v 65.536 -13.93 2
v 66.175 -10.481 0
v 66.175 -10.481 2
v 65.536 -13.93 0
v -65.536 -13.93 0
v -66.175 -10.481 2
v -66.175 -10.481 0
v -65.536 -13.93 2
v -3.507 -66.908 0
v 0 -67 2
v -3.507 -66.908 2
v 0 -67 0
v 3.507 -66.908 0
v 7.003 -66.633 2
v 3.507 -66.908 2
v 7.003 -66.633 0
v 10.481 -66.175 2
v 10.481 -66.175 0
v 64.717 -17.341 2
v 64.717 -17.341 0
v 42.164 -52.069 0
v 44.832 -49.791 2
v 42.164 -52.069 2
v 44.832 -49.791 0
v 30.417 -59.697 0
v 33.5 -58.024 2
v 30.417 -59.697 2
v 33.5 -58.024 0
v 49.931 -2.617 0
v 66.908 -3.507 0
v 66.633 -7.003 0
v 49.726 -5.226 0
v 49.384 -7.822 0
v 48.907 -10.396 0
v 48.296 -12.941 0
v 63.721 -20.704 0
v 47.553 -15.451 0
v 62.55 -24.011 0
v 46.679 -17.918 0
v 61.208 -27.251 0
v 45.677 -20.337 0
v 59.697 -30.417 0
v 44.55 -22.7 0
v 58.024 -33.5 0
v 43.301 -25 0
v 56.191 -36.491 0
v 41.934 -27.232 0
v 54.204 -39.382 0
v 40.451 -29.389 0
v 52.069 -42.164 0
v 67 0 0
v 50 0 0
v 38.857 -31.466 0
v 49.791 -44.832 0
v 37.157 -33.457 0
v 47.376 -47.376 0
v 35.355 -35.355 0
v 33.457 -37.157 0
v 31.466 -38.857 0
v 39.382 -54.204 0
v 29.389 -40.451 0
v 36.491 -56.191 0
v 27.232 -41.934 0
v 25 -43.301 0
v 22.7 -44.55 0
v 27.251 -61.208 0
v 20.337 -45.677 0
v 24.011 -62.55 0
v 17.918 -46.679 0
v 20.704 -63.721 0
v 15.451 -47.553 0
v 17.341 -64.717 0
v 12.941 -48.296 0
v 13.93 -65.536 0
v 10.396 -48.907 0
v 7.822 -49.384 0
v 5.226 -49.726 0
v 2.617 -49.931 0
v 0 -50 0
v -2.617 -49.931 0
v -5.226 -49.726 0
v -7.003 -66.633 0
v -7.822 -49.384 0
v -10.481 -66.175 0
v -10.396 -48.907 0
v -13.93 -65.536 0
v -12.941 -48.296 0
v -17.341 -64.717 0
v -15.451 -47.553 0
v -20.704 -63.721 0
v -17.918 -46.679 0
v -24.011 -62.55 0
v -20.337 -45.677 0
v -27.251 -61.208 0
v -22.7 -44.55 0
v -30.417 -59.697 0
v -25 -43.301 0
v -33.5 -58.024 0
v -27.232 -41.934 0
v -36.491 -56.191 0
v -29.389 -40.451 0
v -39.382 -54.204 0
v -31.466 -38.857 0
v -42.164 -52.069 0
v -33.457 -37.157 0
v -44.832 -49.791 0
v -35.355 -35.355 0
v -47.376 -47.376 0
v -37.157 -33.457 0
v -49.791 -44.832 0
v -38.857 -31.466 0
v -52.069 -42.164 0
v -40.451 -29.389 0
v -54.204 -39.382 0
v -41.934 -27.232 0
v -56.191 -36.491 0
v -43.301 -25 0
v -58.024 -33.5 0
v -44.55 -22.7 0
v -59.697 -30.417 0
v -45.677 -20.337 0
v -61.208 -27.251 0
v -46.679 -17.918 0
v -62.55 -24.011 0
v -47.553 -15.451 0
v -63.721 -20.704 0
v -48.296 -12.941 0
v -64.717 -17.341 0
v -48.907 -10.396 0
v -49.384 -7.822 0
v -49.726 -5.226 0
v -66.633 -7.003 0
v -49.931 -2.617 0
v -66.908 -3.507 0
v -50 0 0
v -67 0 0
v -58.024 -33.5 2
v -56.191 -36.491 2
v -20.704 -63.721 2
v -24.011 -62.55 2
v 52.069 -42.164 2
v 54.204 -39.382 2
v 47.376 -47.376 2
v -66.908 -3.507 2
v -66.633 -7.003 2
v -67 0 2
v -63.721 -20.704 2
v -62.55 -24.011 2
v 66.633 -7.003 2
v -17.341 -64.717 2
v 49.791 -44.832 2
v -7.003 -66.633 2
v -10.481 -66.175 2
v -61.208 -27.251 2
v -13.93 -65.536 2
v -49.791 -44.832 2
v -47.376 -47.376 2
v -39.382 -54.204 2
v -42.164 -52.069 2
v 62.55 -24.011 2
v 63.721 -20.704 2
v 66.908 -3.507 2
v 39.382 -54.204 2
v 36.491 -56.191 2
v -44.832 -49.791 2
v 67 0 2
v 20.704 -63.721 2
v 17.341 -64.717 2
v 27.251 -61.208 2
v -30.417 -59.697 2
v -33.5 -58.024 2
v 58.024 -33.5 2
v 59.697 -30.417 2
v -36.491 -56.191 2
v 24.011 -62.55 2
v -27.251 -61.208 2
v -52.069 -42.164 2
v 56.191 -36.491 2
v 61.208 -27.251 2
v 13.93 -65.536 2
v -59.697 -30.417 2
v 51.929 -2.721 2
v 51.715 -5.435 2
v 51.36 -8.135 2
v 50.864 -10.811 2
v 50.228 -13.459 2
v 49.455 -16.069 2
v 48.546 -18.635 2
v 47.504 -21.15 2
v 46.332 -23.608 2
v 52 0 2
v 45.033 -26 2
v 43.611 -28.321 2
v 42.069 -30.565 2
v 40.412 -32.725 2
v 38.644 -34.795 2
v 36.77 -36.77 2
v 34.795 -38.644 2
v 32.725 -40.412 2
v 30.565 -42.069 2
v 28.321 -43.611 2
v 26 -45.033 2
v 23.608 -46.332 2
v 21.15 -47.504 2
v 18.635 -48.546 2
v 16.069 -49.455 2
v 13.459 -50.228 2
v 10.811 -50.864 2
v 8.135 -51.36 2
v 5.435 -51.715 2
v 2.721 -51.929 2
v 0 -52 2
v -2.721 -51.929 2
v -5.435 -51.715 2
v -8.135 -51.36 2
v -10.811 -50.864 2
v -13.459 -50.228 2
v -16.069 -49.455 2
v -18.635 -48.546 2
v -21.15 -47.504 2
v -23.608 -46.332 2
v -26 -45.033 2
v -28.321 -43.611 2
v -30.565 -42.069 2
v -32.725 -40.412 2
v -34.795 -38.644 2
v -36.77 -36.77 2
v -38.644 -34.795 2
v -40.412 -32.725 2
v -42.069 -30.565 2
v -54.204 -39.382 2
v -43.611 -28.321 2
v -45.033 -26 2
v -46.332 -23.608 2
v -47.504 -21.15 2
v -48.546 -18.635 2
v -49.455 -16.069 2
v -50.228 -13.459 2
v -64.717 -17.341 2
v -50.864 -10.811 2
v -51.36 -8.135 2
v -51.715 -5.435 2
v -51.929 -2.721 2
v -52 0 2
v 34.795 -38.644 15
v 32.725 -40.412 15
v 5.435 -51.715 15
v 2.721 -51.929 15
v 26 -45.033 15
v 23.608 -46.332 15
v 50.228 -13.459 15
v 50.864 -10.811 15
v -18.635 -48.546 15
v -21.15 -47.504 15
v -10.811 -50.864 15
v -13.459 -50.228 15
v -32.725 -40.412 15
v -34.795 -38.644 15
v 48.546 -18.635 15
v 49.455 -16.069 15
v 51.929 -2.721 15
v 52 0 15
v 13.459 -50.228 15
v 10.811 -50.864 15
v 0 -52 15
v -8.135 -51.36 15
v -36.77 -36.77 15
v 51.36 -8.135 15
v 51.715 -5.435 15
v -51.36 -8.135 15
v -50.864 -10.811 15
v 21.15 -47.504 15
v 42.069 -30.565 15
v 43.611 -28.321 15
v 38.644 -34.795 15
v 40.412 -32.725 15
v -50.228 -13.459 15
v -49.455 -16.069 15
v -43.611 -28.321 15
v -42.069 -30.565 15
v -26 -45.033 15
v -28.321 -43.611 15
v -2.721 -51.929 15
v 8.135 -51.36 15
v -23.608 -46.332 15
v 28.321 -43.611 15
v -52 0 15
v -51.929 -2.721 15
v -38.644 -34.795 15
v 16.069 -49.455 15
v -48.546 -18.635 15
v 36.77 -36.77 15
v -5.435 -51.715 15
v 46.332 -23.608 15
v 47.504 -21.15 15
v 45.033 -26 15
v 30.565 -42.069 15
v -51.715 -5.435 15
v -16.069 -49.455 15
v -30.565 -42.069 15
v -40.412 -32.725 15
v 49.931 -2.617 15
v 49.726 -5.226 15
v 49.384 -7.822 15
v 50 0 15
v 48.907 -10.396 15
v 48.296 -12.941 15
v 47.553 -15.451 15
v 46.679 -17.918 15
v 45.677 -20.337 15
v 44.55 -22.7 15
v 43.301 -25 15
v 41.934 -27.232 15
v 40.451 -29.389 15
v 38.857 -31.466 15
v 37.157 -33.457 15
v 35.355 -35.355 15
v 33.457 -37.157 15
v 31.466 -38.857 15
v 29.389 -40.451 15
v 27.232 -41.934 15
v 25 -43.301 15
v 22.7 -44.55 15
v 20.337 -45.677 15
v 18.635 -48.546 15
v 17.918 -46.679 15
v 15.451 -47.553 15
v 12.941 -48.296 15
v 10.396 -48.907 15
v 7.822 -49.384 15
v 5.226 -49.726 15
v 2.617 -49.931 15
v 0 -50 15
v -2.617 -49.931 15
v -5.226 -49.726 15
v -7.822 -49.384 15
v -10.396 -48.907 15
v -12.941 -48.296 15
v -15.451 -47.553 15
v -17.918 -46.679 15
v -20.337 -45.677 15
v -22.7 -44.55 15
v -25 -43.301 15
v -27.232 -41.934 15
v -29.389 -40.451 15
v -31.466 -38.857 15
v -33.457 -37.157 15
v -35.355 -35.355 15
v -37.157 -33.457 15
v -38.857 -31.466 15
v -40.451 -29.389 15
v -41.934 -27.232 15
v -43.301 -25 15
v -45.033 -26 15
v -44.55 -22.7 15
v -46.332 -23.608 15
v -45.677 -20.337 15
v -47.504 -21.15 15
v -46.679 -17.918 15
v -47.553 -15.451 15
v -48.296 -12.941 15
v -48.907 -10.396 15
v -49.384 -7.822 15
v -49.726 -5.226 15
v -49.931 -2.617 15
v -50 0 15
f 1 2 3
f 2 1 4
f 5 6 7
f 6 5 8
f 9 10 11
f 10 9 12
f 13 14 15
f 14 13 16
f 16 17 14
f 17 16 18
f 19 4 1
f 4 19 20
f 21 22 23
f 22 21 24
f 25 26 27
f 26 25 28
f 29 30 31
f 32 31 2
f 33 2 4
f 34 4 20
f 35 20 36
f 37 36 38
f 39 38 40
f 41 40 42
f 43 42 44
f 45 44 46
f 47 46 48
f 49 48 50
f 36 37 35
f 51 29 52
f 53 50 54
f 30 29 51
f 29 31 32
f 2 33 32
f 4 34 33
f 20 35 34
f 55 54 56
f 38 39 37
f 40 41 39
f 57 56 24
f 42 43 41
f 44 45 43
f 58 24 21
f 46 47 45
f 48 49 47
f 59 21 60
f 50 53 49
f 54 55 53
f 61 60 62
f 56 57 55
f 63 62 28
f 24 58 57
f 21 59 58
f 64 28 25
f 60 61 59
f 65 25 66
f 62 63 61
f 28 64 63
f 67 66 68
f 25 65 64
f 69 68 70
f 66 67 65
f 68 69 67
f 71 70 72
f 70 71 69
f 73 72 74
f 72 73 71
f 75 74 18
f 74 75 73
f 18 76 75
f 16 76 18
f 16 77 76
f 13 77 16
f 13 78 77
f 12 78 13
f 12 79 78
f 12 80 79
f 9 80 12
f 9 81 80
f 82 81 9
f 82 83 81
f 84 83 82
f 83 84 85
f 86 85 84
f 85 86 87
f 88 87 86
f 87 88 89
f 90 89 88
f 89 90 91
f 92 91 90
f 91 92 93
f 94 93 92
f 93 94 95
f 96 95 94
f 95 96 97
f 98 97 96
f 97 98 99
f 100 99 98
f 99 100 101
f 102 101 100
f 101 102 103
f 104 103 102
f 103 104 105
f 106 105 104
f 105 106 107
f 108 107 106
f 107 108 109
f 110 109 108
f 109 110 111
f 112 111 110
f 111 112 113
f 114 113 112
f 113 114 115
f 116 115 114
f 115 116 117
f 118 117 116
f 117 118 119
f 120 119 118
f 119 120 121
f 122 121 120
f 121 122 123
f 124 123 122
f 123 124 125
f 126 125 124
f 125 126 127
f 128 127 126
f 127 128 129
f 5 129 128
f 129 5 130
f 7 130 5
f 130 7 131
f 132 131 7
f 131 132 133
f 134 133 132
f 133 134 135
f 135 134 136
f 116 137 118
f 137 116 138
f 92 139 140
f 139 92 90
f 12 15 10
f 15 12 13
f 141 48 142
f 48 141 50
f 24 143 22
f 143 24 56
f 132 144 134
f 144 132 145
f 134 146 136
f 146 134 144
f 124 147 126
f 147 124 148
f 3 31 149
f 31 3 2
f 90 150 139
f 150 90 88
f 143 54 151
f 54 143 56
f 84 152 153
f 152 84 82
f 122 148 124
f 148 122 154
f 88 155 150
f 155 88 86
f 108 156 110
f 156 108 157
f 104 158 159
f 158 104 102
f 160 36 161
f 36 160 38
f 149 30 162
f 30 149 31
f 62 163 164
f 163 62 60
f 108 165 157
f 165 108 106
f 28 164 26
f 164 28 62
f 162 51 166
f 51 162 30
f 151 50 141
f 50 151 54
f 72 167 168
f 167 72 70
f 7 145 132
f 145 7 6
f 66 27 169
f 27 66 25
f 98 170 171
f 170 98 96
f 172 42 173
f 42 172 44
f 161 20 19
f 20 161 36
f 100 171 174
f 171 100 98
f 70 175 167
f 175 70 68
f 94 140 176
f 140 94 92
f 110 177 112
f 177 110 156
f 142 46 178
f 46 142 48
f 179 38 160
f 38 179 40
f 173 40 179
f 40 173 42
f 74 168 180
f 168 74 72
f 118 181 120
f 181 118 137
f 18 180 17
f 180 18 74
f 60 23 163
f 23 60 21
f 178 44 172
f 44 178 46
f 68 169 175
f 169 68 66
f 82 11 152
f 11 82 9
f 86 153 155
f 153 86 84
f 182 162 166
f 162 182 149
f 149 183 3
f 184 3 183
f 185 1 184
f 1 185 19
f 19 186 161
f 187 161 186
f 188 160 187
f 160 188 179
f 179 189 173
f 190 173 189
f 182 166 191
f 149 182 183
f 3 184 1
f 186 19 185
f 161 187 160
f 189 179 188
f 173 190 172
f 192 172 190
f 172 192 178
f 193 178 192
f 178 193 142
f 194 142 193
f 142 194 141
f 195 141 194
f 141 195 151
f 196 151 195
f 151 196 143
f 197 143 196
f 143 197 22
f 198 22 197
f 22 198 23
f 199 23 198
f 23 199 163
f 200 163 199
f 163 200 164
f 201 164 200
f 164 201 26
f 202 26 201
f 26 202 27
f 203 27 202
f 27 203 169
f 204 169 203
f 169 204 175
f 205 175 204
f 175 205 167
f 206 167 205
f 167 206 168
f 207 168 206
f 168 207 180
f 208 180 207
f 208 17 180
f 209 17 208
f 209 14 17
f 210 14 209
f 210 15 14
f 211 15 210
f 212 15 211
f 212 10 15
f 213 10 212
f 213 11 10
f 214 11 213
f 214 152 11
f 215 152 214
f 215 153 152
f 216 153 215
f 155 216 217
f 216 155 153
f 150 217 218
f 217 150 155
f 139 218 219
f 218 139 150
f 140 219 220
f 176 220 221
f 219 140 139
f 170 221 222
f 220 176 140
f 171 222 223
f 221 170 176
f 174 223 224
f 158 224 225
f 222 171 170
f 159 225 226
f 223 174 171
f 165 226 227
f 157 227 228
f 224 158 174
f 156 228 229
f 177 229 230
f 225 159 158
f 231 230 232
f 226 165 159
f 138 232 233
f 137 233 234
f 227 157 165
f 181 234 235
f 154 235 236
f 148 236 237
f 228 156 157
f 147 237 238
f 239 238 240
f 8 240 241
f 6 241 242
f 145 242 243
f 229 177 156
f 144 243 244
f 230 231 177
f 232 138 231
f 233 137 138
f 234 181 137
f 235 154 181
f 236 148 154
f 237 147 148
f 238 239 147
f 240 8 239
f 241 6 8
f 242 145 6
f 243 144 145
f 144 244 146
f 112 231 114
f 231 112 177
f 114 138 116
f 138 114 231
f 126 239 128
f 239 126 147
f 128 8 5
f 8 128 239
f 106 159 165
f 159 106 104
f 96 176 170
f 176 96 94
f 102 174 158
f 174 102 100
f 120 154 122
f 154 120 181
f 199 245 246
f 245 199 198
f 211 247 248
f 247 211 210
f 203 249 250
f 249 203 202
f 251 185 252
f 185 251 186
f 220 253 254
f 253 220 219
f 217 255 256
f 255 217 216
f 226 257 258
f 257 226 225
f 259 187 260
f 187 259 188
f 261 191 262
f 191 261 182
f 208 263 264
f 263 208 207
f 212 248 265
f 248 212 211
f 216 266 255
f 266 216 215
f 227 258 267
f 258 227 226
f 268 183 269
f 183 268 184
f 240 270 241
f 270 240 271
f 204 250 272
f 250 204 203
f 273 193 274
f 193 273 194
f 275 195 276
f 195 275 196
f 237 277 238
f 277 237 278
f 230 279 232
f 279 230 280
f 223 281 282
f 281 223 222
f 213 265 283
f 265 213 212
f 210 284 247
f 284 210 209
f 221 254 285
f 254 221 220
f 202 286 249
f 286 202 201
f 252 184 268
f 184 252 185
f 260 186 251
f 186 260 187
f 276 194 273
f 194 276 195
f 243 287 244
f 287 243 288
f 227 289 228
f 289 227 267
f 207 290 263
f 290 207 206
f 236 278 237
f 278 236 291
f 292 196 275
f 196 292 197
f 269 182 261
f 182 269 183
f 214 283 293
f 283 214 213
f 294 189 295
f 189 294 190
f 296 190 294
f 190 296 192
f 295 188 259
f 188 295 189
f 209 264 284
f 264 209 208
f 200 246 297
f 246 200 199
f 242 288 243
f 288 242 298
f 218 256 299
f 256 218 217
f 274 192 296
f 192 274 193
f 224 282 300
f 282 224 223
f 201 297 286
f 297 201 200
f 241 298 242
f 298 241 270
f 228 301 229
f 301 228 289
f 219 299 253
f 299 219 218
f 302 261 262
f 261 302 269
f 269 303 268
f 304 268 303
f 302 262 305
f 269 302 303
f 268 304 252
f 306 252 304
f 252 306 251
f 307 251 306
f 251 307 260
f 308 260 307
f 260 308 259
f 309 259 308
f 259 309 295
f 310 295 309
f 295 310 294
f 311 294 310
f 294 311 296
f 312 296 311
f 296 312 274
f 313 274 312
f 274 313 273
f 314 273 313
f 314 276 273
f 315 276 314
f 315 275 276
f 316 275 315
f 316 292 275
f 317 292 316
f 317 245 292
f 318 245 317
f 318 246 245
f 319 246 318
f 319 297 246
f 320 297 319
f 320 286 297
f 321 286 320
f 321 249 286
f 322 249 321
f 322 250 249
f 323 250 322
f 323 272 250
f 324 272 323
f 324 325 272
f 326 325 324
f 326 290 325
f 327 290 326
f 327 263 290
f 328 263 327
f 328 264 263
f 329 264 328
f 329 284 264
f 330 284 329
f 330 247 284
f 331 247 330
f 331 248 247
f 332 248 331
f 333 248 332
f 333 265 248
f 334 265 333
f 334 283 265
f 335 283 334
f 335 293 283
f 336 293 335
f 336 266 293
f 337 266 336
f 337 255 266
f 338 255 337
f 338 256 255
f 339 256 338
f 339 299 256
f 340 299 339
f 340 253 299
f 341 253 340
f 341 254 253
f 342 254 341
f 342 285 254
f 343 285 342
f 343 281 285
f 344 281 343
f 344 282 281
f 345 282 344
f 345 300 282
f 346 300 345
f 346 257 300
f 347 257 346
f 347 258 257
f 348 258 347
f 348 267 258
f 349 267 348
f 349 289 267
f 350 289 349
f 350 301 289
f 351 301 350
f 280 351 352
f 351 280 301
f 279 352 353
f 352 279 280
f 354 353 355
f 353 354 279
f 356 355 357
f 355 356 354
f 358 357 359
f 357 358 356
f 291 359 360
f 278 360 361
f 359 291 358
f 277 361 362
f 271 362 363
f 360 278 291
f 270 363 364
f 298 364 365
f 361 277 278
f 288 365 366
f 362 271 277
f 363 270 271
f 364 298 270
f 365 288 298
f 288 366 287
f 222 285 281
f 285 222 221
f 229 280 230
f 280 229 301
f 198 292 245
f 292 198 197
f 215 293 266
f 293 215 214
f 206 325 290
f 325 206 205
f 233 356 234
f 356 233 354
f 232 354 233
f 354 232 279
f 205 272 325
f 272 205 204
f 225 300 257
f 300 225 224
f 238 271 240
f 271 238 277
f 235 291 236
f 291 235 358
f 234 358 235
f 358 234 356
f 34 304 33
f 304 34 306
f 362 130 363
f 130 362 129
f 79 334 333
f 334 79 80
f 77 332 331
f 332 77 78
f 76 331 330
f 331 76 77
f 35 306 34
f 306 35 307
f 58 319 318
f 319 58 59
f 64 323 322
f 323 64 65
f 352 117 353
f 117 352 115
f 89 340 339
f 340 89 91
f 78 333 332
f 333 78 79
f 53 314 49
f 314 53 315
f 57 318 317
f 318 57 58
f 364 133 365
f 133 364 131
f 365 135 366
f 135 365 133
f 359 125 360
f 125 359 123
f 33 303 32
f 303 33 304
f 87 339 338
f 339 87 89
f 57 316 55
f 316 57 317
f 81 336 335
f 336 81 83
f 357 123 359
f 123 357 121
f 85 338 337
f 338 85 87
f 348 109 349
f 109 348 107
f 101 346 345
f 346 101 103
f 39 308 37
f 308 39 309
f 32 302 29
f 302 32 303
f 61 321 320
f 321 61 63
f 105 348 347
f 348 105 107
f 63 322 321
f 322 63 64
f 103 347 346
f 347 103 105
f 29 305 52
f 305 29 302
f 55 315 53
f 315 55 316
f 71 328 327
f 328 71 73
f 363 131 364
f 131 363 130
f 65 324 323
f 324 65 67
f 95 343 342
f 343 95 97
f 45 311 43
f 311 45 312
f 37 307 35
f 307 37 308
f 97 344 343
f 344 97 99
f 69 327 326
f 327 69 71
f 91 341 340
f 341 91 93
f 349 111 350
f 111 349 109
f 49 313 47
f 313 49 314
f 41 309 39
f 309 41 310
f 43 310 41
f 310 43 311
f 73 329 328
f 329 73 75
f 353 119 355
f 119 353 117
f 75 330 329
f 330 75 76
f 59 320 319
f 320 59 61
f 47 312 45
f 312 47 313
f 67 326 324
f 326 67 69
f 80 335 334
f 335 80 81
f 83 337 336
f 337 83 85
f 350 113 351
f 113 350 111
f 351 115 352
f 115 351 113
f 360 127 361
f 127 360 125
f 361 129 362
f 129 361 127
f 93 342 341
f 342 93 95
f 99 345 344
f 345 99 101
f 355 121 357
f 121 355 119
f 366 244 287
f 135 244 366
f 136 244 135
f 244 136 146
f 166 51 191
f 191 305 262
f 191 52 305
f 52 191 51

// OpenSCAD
// general size flange 
// July 5, 2013
// R Lazure

Inside_Diameter=100;//[10:200]
Flange_Lip=15;//[5,10,15,20,25,30]
Edge_Height=15;//[5,10,15,20,25,30]
$fa=2+1;
thickness=1.95+.05;
OD= Inside_Diameter+2*Flange_Lip+2*thickness;
ODrad= OD/2;
IDrad= Inside_Diameter/2;
innerrad= IDrad+thickness;

intersection(){
	translate([-ODrad-15,-OD-30,0]) cube(OD+30,OD+30,OD+30);
 difference() {
   union(){
     cylinder(thickness, ODrad, ODrad);
    cylinder(Edge_Height, innerrad, innerrad);
          }
   translate([0,0,-10]) cylinder(Edge_Height+20,Inside_Diameter/2,Inside_Diameter/2);
             }
		}

 
